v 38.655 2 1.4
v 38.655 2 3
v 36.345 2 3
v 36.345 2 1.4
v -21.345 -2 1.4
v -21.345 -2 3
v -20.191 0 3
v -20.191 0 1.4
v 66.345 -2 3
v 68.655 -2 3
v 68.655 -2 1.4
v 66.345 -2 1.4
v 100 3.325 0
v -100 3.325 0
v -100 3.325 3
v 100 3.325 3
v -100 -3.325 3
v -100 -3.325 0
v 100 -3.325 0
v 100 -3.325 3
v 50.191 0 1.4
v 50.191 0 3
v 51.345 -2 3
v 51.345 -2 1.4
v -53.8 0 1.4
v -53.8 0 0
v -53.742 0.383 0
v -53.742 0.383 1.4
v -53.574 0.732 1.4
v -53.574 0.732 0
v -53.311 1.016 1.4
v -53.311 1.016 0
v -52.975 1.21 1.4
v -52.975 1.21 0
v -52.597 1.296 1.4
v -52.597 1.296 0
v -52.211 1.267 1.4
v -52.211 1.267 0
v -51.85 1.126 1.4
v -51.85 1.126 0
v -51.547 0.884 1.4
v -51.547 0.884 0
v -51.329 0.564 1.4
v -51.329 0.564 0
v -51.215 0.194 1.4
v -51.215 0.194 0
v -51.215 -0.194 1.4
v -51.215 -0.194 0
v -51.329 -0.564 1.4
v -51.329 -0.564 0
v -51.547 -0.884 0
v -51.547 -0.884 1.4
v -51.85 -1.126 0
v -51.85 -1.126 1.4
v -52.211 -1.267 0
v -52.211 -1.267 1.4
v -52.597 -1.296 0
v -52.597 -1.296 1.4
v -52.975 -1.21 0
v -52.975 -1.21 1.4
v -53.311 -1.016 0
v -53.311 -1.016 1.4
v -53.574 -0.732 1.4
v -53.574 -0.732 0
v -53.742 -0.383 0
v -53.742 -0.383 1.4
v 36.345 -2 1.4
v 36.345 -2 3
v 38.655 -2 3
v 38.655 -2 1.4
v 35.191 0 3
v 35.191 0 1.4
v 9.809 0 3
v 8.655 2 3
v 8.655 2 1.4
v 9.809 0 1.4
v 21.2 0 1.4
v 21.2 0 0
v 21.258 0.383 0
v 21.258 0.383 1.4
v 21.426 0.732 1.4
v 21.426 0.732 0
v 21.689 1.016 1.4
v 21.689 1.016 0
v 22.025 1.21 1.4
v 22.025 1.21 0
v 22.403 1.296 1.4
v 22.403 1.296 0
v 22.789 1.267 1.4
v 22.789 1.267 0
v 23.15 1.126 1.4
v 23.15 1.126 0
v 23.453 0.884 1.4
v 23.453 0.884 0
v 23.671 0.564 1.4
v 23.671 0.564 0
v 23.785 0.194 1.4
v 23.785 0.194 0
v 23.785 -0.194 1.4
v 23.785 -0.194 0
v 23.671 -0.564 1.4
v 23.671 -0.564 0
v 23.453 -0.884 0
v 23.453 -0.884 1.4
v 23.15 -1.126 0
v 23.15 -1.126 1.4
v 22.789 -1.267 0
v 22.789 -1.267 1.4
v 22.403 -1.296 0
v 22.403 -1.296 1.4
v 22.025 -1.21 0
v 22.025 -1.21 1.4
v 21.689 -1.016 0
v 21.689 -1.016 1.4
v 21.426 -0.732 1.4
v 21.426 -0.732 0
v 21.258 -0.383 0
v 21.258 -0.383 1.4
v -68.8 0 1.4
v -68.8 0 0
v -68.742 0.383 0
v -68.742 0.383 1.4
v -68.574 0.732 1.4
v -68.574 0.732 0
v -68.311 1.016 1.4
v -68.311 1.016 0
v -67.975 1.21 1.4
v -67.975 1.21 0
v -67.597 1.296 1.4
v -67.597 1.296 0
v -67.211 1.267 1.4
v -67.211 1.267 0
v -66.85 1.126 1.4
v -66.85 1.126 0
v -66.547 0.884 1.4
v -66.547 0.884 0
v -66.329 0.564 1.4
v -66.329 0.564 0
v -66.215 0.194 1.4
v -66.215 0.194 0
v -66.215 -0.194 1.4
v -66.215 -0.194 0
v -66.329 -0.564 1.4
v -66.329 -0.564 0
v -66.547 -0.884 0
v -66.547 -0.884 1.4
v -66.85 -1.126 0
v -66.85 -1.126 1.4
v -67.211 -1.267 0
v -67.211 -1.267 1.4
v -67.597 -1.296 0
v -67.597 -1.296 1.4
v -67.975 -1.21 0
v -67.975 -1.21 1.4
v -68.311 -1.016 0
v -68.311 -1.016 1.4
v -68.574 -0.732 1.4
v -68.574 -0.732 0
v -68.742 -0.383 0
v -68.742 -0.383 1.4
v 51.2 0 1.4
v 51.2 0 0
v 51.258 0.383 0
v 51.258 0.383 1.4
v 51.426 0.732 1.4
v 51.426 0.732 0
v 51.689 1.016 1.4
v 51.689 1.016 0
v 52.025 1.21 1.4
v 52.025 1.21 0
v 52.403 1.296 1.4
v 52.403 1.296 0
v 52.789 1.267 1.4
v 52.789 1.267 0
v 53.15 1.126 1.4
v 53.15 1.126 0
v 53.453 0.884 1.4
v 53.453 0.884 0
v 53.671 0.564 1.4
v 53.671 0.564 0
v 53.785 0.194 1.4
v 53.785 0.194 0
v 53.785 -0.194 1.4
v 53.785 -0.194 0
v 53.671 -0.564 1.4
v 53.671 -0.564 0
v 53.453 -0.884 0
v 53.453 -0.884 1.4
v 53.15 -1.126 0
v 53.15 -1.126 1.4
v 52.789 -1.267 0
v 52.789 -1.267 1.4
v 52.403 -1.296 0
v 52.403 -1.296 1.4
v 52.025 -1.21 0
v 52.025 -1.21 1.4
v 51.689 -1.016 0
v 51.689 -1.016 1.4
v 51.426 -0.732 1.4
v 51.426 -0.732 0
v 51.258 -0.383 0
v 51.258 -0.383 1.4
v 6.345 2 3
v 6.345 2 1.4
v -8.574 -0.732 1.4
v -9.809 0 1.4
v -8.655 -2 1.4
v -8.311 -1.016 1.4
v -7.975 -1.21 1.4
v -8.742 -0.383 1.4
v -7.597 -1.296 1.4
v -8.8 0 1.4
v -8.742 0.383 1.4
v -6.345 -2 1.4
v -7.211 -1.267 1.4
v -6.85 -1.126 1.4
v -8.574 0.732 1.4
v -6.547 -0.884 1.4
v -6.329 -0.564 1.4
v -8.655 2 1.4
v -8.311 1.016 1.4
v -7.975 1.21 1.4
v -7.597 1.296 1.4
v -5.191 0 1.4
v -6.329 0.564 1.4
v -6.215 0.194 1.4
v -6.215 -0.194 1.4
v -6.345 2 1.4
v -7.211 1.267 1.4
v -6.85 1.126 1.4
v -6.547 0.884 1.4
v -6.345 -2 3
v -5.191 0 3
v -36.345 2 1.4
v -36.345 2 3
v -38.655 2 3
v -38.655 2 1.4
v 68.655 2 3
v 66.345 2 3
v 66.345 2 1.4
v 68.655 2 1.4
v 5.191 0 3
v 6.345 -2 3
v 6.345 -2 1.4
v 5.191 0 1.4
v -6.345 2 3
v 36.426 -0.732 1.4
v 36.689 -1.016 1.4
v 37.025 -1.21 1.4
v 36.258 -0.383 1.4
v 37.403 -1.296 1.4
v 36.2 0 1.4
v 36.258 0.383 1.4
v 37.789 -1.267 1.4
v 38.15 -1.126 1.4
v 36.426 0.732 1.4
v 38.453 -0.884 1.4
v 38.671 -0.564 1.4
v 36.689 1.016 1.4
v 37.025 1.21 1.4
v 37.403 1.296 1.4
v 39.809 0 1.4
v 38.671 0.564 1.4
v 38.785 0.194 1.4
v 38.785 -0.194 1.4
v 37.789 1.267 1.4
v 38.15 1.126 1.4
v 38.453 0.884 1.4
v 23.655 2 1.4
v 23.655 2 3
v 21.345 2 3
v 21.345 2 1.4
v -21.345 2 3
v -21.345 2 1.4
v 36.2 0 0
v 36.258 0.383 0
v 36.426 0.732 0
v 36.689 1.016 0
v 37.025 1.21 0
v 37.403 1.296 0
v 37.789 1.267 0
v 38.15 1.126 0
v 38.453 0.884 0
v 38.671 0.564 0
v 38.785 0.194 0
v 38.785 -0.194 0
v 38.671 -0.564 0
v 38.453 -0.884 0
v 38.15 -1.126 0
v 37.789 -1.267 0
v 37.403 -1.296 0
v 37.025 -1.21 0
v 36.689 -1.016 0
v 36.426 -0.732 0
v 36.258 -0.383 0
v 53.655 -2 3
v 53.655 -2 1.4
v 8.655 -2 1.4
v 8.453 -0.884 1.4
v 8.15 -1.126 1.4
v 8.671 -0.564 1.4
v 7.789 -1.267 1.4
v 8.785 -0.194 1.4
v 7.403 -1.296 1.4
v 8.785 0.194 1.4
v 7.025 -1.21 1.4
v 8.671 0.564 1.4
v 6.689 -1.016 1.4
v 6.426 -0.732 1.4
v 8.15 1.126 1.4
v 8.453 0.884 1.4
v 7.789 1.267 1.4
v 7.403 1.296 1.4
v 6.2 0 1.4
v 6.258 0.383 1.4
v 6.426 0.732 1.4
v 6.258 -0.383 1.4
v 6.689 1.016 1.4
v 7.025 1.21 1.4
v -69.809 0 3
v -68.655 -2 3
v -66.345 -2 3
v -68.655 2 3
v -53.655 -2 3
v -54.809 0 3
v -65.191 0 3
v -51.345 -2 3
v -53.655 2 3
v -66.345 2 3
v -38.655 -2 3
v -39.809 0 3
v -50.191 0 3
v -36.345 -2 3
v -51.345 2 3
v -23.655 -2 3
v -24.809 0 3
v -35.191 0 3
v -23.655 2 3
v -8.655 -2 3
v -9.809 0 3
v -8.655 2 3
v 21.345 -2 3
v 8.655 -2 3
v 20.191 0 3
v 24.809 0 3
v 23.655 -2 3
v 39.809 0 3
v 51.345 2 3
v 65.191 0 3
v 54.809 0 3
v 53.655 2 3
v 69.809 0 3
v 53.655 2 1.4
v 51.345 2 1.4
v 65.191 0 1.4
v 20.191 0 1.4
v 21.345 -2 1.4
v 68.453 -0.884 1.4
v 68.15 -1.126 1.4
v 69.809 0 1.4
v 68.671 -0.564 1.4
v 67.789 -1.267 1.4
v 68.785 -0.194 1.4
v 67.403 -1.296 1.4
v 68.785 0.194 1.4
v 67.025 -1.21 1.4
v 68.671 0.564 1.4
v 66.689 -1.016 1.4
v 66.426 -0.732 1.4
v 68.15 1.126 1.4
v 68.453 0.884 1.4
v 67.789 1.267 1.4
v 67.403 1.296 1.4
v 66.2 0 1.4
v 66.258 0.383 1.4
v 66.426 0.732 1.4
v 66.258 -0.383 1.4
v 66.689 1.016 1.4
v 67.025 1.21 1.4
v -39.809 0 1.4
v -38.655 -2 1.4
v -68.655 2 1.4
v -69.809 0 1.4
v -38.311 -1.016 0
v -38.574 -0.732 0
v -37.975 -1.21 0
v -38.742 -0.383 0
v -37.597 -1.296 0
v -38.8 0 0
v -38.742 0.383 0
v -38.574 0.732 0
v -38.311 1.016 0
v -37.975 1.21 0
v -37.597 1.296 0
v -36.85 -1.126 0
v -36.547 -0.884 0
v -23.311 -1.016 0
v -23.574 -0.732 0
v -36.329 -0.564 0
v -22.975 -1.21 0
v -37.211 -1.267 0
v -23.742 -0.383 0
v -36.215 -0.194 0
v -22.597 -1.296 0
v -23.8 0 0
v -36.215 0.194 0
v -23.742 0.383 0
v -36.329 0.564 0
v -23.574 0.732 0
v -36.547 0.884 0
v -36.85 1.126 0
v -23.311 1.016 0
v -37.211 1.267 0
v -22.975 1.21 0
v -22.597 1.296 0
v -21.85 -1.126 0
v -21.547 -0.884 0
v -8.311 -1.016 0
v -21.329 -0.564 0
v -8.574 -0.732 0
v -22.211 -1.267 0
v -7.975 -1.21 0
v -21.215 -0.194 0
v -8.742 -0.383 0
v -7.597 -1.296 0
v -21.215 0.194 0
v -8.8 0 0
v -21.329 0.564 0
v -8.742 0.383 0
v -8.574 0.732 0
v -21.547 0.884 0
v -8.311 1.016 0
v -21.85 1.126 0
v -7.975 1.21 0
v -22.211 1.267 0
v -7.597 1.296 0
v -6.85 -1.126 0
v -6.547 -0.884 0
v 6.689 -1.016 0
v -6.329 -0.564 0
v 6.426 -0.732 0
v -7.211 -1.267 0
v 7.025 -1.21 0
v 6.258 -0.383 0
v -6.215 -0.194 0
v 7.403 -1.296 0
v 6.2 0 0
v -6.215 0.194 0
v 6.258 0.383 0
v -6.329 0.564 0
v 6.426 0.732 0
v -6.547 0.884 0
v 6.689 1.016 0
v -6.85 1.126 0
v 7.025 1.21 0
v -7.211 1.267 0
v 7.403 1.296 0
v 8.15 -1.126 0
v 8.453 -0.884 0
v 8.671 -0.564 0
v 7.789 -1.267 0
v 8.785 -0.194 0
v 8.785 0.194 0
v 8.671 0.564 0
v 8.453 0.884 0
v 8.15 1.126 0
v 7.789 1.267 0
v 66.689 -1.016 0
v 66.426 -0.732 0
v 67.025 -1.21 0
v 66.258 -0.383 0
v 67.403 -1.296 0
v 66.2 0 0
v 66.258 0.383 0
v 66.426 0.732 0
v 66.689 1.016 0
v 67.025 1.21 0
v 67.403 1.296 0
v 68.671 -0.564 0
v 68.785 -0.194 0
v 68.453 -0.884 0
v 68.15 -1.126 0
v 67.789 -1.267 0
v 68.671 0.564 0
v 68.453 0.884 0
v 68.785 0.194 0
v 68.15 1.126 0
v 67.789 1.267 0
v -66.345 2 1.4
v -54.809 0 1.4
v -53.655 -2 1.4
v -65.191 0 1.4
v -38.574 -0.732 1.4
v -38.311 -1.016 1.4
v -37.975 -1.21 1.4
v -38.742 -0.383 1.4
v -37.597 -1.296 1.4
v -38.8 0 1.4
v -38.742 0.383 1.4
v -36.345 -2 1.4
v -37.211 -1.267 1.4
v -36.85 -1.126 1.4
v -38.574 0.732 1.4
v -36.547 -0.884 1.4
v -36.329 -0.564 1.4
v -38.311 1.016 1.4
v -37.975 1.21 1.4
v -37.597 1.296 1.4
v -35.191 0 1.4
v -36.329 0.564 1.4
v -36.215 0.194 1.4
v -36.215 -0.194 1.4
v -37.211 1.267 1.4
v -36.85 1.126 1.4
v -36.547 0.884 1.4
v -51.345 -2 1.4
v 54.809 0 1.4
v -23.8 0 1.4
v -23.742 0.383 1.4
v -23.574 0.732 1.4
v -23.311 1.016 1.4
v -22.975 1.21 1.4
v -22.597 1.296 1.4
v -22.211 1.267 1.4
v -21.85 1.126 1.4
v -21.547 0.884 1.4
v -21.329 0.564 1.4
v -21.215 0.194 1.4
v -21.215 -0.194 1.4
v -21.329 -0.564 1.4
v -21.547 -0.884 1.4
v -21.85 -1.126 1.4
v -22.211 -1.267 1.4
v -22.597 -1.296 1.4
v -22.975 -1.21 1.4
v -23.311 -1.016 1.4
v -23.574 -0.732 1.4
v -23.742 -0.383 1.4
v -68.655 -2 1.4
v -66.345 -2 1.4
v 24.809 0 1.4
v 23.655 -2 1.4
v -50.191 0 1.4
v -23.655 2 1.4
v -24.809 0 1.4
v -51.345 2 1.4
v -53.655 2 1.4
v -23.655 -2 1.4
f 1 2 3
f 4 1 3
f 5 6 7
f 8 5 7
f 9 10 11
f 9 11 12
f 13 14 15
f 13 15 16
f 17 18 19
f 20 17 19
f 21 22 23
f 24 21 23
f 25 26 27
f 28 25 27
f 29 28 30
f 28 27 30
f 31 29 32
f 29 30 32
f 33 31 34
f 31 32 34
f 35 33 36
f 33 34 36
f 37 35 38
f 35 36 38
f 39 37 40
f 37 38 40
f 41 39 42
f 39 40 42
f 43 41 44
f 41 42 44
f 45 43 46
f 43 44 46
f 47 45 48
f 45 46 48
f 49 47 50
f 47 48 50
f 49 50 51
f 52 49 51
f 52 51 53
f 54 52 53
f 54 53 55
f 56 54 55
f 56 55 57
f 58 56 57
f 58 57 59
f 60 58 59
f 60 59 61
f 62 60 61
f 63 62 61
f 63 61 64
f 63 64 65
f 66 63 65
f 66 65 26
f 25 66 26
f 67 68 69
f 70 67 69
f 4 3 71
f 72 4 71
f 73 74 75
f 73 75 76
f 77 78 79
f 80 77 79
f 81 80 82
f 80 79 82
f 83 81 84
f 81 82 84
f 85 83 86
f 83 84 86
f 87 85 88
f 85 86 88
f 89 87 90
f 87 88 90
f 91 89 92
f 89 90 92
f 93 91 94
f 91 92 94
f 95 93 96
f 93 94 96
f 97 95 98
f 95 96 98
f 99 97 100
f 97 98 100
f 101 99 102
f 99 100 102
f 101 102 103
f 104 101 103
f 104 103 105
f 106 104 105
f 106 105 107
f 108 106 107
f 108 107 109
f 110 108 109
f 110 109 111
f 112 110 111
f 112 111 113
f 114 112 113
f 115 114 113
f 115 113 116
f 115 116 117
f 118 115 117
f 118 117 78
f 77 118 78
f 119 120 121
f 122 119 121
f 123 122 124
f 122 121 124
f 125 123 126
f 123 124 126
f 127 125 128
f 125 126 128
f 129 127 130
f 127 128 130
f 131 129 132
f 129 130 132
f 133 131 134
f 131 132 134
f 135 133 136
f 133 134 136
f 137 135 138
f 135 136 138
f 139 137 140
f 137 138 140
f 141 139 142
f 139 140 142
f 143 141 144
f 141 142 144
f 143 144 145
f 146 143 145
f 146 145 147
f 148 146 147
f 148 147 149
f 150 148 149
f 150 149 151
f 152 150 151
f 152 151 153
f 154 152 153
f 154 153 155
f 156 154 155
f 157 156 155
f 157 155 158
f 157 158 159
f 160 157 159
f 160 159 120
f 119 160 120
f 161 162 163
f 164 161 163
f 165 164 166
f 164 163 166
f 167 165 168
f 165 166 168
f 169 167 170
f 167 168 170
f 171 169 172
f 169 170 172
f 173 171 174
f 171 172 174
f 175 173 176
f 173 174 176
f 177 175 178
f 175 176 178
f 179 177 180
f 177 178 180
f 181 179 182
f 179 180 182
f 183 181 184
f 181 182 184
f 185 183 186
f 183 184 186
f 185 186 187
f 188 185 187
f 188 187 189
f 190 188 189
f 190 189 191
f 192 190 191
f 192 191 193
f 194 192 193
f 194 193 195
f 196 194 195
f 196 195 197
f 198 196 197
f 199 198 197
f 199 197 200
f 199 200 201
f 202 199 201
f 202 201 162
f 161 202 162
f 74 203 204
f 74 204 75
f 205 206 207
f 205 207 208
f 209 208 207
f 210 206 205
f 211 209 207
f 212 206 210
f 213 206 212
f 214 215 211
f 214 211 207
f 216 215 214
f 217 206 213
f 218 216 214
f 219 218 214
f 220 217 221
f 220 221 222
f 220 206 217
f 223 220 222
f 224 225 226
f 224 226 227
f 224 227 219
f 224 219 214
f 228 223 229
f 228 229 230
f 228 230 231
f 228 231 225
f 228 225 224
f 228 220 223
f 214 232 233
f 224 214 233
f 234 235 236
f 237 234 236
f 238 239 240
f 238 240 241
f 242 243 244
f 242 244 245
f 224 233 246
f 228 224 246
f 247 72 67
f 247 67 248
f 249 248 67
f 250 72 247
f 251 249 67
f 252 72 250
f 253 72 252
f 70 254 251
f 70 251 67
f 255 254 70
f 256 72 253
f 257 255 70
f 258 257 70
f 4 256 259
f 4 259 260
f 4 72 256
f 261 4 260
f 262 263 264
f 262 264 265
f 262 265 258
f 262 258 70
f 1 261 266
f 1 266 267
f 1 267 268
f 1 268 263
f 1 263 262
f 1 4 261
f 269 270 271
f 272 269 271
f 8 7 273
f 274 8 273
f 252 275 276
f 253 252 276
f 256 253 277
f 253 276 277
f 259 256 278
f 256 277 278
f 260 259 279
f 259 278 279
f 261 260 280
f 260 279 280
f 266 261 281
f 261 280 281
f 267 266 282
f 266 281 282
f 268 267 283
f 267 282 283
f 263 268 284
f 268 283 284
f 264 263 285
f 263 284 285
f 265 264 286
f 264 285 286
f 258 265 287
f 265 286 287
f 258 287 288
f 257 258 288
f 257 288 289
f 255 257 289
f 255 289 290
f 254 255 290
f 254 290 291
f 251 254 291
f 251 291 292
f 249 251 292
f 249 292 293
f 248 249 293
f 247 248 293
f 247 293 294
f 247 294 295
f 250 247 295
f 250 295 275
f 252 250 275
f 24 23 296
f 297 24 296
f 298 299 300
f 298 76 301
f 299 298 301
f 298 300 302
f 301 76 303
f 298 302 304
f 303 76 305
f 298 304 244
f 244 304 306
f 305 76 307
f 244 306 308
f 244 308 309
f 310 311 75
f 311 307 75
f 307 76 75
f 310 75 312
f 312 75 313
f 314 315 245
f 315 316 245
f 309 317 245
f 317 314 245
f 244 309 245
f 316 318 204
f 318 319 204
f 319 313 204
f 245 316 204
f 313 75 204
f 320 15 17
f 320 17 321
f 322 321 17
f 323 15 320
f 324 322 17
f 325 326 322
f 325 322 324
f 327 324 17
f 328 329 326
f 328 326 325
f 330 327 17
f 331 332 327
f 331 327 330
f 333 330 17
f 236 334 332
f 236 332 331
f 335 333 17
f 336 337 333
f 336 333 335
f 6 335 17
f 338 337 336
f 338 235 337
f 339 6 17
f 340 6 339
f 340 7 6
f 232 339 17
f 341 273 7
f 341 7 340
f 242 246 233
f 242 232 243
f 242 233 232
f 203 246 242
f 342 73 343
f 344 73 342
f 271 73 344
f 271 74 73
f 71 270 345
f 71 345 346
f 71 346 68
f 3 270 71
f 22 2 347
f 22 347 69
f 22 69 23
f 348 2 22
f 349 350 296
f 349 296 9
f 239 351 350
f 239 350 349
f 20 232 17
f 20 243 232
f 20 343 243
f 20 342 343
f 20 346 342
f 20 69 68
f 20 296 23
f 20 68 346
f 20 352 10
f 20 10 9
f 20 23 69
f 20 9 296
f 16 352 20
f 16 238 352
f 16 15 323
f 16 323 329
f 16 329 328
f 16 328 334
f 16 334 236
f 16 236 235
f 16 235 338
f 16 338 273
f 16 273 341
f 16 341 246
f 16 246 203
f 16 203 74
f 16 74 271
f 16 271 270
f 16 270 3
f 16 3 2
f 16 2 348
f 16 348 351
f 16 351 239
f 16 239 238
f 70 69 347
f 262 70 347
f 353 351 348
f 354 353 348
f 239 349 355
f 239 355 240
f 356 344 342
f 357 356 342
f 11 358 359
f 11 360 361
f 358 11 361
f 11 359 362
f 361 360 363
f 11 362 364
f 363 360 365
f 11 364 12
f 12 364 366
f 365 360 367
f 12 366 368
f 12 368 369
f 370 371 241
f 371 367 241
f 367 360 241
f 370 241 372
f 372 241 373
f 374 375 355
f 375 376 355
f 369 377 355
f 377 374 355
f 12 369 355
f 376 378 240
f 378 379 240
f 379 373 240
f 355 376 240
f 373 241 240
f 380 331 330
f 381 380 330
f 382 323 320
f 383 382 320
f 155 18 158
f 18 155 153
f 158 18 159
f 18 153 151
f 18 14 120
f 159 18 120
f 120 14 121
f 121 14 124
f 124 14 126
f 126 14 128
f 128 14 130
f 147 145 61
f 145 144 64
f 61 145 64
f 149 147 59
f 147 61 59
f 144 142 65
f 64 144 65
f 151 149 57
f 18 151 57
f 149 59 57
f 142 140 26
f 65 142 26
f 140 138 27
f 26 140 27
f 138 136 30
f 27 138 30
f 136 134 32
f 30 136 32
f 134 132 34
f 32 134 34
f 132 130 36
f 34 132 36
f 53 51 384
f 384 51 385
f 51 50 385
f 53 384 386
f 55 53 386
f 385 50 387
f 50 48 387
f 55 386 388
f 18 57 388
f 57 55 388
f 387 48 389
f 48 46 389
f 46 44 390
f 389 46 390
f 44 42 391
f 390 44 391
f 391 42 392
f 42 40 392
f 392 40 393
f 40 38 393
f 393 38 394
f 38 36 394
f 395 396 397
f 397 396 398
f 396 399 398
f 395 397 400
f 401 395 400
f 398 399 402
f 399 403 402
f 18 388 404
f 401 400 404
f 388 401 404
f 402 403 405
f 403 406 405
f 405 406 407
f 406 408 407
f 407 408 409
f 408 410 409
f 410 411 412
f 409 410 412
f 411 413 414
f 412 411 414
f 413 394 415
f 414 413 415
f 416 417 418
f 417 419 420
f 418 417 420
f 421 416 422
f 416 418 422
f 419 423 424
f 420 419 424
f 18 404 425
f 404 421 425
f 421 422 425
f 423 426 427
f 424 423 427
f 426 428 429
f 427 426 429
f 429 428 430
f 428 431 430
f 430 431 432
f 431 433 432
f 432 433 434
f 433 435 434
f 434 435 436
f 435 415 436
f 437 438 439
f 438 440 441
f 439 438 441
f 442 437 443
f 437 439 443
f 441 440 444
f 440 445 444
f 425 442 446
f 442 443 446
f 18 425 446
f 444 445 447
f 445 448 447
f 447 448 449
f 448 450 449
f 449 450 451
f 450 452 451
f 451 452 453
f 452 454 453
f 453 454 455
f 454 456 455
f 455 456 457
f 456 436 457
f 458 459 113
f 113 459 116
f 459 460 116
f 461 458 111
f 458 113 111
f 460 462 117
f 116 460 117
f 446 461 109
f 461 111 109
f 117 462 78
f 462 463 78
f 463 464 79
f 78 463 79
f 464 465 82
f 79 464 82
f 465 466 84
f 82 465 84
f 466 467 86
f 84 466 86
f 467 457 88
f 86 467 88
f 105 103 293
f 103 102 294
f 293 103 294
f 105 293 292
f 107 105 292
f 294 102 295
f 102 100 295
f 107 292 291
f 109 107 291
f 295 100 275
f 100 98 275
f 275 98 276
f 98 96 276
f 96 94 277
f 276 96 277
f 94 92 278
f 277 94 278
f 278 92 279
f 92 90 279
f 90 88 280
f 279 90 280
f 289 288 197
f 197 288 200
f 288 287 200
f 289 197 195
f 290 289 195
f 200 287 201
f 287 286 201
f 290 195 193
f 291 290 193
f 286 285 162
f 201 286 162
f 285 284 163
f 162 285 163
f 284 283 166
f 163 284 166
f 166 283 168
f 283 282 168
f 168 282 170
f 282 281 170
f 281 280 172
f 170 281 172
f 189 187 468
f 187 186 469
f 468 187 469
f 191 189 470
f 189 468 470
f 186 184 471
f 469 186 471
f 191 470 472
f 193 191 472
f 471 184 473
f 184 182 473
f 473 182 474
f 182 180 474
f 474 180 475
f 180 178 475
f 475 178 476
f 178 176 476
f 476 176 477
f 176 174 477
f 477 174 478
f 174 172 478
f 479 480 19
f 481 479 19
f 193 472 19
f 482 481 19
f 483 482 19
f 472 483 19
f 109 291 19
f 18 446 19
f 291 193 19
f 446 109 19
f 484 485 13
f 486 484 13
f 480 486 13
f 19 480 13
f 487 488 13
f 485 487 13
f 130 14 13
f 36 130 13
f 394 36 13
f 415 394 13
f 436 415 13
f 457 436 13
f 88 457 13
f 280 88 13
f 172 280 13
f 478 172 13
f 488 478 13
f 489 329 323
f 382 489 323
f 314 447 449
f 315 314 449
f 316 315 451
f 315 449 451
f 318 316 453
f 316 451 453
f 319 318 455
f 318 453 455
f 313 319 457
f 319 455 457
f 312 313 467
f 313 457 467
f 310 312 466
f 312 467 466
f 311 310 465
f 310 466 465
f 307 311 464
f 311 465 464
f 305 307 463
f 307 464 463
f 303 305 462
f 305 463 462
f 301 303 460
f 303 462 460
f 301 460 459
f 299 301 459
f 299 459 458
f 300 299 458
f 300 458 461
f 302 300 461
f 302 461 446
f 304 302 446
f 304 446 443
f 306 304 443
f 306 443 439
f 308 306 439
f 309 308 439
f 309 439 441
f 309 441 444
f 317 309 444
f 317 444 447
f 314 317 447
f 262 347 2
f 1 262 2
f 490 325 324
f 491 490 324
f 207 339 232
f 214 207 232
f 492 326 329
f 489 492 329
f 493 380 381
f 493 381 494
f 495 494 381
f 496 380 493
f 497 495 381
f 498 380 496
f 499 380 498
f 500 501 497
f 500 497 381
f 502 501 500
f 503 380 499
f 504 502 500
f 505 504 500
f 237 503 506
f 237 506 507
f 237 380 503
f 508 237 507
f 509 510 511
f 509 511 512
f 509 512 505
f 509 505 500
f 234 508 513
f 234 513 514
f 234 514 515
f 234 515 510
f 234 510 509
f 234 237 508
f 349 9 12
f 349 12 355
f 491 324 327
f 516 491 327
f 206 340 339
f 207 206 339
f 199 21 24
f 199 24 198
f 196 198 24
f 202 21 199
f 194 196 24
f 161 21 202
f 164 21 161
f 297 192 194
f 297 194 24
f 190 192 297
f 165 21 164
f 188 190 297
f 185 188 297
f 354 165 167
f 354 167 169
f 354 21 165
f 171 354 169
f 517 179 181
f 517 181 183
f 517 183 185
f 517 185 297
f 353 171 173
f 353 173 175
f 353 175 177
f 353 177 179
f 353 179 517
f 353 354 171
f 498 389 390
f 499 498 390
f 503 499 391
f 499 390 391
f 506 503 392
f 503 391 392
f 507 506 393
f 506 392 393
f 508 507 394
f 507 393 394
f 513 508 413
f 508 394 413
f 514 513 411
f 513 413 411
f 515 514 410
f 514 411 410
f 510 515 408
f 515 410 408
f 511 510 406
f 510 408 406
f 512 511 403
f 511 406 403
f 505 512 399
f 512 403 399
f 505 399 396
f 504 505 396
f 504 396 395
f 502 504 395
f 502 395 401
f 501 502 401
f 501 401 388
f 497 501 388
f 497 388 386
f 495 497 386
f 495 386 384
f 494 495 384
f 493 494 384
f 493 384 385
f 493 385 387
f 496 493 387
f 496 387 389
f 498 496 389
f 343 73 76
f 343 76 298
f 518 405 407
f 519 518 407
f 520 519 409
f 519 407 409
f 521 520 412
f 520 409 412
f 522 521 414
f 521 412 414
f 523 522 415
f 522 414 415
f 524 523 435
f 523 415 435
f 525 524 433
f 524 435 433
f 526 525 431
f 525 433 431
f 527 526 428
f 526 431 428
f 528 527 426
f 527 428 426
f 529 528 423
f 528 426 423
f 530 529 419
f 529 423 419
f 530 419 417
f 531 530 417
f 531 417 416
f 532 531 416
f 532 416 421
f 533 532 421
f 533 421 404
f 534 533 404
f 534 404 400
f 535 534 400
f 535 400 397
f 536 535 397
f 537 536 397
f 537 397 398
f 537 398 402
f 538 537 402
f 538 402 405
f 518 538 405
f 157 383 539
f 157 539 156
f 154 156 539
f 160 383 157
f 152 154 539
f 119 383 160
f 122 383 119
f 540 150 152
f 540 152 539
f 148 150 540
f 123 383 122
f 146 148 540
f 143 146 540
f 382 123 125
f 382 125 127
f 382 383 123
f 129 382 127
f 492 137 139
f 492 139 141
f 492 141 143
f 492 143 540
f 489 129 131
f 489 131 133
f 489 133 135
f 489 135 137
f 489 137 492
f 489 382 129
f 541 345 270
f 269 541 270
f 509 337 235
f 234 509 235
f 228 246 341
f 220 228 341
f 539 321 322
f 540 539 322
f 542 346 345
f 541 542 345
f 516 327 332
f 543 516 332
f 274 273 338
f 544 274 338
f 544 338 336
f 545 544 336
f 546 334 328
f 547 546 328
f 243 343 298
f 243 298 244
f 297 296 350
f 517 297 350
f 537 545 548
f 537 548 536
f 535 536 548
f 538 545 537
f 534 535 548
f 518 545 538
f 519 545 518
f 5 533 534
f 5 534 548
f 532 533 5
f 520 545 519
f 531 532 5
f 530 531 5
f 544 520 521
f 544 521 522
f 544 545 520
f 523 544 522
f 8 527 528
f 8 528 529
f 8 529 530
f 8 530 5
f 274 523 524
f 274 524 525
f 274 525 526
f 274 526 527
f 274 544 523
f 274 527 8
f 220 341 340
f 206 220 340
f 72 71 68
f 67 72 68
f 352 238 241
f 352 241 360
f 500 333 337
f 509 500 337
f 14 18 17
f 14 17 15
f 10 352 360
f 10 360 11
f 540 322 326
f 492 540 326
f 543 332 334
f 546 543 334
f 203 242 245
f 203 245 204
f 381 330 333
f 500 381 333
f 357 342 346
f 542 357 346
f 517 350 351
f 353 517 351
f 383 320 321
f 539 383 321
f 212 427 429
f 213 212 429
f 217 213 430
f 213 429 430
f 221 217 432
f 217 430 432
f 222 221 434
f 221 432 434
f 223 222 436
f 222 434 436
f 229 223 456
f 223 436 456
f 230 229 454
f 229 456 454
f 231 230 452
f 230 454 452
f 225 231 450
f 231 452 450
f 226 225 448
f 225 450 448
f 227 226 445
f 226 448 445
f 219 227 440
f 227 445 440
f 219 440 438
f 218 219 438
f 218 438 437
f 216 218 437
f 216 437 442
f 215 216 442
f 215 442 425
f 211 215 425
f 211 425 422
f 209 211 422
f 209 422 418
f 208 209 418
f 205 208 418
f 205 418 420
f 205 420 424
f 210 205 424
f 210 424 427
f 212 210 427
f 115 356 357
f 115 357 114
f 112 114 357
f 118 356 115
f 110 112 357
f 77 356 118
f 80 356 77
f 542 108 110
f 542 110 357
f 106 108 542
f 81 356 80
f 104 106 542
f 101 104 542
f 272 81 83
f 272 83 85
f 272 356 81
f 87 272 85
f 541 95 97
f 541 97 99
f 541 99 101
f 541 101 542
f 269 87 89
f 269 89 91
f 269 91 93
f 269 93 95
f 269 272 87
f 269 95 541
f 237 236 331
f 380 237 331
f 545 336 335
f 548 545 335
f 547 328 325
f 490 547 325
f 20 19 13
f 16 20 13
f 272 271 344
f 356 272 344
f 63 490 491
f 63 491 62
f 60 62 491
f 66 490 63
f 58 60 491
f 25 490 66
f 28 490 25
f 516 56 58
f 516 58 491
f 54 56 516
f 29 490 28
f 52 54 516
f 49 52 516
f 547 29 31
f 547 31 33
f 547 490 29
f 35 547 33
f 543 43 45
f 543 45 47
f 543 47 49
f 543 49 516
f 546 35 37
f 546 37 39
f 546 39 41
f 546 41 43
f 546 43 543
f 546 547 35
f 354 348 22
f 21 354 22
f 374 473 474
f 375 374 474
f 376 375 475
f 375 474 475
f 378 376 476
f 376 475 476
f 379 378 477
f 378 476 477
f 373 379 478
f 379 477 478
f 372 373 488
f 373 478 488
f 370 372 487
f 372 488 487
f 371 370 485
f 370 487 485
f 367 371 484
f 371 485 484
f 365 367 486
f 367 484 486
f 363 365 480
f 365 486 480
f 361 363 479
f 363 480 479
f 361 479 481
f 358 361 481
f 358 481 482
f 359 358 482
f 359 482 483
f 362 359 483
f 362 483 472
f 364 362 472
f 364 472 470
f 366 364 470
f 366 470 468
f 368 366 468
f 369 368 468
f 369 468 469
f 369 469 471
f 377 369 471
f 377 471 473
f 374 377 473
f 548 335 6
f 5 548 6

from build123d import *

# Parameters (mm, degrees)
SKETCH2_W                        = 200
SKETCH2_H                        = 6.65
BOSS_EXTRUDE1_DEPTH              = 3
CUT_EXTRUDE1_DEPTH               = 1.6
LPATTERN1_COUNT                  = 5
LPATTERN1_PITCH                  = 15
LPATTERN1_COUNT_DIR2             = 5
LPATTERN1_PITCH_DIR2             = 15
TALADRO_DE_MARGEN_PARA_M21_D     = 2.6
TALADRO_DE_MARGEN_PARA_M21_DEPTH = 12.5
TALADRO_DE_MARGEN_PARA_M21_TIP   = 0.781118805


with BuildPart() as part:
    # Sketch2 → Boss-Extrude1 (new body)
    with BuildSketch(Plane.XY):
        Rectangle(SKETCH2_W, SKETCH2_H)
    extrude(amount=BOSS_EXTRUDE1_DEPTH)

    # Sketch3 → Cut-Extrude1 (cut)
    with BuildSketch(Plane.XY.offset(3)):
        Polygon((-5.190598923, 0), (-6.345299462, 2), (-8.654700538, 2), (-9.809401077, 0), (-8.654700538, -2), (-6.345299462, -2), align=None)
        Polygon((5.190598923, 0), (6.345299462, 2), (8.654700538, 2), (9.809401077, 0), (8.654700538, -2), (6.345299462, -2), align=None)
    cut_extrude1 = extrude(amount=-CUT_EXTRUDE1_DEPTH, mode=Mode.SUBTRACT)

    # LPattern1: Cut-Extrude1 5 × 5
    with Locations(*[Vector(-1, 0, 0) * (i * LPATTERN1_PITCH) + Vector(1, 0, 0) * (j * LPATTERN1_PITCH_DIR2) for i in range(LPATTERN1_COUNT) for j in range(LPATTERN1_COUNT_DIR2) if (i, j) != (0, 0)]):
        add(cut_extrude1, mode=Mode.SUBTRACT)

    # Taladro de margen para M21
    with Locations(Plane.XY.offset(3)):
        with Locations((37.5, 0), (52.5, 0), (67.5, 0), (22.5, 0), (7.5, 0), (-67.5, 0), (-52.5, 0), (-37.5, 0), (-7.5, 0), (-22.5, 0)):
            Hole(TALADRO_DE_MARGEN_PARA_M21_D / 2, depth=TALADRO_DE_MARGEN_PARA_M21_DEPTH)
            with Locations((0, 0, -(TALADRO_DE_MARGEN_PARA_M21_DEPTH + TALADRO_DE_MARGEN_PARA_M21_TIP / 2))):  # 118° drill point
                Cone(0, TALADRO_DE_MARGEN_PARA_M21_D / 2, TALADRO_DE_MARGEN_PARA_M21_TIP, mode=Mode.SUBTRACT)


solid = part.part
